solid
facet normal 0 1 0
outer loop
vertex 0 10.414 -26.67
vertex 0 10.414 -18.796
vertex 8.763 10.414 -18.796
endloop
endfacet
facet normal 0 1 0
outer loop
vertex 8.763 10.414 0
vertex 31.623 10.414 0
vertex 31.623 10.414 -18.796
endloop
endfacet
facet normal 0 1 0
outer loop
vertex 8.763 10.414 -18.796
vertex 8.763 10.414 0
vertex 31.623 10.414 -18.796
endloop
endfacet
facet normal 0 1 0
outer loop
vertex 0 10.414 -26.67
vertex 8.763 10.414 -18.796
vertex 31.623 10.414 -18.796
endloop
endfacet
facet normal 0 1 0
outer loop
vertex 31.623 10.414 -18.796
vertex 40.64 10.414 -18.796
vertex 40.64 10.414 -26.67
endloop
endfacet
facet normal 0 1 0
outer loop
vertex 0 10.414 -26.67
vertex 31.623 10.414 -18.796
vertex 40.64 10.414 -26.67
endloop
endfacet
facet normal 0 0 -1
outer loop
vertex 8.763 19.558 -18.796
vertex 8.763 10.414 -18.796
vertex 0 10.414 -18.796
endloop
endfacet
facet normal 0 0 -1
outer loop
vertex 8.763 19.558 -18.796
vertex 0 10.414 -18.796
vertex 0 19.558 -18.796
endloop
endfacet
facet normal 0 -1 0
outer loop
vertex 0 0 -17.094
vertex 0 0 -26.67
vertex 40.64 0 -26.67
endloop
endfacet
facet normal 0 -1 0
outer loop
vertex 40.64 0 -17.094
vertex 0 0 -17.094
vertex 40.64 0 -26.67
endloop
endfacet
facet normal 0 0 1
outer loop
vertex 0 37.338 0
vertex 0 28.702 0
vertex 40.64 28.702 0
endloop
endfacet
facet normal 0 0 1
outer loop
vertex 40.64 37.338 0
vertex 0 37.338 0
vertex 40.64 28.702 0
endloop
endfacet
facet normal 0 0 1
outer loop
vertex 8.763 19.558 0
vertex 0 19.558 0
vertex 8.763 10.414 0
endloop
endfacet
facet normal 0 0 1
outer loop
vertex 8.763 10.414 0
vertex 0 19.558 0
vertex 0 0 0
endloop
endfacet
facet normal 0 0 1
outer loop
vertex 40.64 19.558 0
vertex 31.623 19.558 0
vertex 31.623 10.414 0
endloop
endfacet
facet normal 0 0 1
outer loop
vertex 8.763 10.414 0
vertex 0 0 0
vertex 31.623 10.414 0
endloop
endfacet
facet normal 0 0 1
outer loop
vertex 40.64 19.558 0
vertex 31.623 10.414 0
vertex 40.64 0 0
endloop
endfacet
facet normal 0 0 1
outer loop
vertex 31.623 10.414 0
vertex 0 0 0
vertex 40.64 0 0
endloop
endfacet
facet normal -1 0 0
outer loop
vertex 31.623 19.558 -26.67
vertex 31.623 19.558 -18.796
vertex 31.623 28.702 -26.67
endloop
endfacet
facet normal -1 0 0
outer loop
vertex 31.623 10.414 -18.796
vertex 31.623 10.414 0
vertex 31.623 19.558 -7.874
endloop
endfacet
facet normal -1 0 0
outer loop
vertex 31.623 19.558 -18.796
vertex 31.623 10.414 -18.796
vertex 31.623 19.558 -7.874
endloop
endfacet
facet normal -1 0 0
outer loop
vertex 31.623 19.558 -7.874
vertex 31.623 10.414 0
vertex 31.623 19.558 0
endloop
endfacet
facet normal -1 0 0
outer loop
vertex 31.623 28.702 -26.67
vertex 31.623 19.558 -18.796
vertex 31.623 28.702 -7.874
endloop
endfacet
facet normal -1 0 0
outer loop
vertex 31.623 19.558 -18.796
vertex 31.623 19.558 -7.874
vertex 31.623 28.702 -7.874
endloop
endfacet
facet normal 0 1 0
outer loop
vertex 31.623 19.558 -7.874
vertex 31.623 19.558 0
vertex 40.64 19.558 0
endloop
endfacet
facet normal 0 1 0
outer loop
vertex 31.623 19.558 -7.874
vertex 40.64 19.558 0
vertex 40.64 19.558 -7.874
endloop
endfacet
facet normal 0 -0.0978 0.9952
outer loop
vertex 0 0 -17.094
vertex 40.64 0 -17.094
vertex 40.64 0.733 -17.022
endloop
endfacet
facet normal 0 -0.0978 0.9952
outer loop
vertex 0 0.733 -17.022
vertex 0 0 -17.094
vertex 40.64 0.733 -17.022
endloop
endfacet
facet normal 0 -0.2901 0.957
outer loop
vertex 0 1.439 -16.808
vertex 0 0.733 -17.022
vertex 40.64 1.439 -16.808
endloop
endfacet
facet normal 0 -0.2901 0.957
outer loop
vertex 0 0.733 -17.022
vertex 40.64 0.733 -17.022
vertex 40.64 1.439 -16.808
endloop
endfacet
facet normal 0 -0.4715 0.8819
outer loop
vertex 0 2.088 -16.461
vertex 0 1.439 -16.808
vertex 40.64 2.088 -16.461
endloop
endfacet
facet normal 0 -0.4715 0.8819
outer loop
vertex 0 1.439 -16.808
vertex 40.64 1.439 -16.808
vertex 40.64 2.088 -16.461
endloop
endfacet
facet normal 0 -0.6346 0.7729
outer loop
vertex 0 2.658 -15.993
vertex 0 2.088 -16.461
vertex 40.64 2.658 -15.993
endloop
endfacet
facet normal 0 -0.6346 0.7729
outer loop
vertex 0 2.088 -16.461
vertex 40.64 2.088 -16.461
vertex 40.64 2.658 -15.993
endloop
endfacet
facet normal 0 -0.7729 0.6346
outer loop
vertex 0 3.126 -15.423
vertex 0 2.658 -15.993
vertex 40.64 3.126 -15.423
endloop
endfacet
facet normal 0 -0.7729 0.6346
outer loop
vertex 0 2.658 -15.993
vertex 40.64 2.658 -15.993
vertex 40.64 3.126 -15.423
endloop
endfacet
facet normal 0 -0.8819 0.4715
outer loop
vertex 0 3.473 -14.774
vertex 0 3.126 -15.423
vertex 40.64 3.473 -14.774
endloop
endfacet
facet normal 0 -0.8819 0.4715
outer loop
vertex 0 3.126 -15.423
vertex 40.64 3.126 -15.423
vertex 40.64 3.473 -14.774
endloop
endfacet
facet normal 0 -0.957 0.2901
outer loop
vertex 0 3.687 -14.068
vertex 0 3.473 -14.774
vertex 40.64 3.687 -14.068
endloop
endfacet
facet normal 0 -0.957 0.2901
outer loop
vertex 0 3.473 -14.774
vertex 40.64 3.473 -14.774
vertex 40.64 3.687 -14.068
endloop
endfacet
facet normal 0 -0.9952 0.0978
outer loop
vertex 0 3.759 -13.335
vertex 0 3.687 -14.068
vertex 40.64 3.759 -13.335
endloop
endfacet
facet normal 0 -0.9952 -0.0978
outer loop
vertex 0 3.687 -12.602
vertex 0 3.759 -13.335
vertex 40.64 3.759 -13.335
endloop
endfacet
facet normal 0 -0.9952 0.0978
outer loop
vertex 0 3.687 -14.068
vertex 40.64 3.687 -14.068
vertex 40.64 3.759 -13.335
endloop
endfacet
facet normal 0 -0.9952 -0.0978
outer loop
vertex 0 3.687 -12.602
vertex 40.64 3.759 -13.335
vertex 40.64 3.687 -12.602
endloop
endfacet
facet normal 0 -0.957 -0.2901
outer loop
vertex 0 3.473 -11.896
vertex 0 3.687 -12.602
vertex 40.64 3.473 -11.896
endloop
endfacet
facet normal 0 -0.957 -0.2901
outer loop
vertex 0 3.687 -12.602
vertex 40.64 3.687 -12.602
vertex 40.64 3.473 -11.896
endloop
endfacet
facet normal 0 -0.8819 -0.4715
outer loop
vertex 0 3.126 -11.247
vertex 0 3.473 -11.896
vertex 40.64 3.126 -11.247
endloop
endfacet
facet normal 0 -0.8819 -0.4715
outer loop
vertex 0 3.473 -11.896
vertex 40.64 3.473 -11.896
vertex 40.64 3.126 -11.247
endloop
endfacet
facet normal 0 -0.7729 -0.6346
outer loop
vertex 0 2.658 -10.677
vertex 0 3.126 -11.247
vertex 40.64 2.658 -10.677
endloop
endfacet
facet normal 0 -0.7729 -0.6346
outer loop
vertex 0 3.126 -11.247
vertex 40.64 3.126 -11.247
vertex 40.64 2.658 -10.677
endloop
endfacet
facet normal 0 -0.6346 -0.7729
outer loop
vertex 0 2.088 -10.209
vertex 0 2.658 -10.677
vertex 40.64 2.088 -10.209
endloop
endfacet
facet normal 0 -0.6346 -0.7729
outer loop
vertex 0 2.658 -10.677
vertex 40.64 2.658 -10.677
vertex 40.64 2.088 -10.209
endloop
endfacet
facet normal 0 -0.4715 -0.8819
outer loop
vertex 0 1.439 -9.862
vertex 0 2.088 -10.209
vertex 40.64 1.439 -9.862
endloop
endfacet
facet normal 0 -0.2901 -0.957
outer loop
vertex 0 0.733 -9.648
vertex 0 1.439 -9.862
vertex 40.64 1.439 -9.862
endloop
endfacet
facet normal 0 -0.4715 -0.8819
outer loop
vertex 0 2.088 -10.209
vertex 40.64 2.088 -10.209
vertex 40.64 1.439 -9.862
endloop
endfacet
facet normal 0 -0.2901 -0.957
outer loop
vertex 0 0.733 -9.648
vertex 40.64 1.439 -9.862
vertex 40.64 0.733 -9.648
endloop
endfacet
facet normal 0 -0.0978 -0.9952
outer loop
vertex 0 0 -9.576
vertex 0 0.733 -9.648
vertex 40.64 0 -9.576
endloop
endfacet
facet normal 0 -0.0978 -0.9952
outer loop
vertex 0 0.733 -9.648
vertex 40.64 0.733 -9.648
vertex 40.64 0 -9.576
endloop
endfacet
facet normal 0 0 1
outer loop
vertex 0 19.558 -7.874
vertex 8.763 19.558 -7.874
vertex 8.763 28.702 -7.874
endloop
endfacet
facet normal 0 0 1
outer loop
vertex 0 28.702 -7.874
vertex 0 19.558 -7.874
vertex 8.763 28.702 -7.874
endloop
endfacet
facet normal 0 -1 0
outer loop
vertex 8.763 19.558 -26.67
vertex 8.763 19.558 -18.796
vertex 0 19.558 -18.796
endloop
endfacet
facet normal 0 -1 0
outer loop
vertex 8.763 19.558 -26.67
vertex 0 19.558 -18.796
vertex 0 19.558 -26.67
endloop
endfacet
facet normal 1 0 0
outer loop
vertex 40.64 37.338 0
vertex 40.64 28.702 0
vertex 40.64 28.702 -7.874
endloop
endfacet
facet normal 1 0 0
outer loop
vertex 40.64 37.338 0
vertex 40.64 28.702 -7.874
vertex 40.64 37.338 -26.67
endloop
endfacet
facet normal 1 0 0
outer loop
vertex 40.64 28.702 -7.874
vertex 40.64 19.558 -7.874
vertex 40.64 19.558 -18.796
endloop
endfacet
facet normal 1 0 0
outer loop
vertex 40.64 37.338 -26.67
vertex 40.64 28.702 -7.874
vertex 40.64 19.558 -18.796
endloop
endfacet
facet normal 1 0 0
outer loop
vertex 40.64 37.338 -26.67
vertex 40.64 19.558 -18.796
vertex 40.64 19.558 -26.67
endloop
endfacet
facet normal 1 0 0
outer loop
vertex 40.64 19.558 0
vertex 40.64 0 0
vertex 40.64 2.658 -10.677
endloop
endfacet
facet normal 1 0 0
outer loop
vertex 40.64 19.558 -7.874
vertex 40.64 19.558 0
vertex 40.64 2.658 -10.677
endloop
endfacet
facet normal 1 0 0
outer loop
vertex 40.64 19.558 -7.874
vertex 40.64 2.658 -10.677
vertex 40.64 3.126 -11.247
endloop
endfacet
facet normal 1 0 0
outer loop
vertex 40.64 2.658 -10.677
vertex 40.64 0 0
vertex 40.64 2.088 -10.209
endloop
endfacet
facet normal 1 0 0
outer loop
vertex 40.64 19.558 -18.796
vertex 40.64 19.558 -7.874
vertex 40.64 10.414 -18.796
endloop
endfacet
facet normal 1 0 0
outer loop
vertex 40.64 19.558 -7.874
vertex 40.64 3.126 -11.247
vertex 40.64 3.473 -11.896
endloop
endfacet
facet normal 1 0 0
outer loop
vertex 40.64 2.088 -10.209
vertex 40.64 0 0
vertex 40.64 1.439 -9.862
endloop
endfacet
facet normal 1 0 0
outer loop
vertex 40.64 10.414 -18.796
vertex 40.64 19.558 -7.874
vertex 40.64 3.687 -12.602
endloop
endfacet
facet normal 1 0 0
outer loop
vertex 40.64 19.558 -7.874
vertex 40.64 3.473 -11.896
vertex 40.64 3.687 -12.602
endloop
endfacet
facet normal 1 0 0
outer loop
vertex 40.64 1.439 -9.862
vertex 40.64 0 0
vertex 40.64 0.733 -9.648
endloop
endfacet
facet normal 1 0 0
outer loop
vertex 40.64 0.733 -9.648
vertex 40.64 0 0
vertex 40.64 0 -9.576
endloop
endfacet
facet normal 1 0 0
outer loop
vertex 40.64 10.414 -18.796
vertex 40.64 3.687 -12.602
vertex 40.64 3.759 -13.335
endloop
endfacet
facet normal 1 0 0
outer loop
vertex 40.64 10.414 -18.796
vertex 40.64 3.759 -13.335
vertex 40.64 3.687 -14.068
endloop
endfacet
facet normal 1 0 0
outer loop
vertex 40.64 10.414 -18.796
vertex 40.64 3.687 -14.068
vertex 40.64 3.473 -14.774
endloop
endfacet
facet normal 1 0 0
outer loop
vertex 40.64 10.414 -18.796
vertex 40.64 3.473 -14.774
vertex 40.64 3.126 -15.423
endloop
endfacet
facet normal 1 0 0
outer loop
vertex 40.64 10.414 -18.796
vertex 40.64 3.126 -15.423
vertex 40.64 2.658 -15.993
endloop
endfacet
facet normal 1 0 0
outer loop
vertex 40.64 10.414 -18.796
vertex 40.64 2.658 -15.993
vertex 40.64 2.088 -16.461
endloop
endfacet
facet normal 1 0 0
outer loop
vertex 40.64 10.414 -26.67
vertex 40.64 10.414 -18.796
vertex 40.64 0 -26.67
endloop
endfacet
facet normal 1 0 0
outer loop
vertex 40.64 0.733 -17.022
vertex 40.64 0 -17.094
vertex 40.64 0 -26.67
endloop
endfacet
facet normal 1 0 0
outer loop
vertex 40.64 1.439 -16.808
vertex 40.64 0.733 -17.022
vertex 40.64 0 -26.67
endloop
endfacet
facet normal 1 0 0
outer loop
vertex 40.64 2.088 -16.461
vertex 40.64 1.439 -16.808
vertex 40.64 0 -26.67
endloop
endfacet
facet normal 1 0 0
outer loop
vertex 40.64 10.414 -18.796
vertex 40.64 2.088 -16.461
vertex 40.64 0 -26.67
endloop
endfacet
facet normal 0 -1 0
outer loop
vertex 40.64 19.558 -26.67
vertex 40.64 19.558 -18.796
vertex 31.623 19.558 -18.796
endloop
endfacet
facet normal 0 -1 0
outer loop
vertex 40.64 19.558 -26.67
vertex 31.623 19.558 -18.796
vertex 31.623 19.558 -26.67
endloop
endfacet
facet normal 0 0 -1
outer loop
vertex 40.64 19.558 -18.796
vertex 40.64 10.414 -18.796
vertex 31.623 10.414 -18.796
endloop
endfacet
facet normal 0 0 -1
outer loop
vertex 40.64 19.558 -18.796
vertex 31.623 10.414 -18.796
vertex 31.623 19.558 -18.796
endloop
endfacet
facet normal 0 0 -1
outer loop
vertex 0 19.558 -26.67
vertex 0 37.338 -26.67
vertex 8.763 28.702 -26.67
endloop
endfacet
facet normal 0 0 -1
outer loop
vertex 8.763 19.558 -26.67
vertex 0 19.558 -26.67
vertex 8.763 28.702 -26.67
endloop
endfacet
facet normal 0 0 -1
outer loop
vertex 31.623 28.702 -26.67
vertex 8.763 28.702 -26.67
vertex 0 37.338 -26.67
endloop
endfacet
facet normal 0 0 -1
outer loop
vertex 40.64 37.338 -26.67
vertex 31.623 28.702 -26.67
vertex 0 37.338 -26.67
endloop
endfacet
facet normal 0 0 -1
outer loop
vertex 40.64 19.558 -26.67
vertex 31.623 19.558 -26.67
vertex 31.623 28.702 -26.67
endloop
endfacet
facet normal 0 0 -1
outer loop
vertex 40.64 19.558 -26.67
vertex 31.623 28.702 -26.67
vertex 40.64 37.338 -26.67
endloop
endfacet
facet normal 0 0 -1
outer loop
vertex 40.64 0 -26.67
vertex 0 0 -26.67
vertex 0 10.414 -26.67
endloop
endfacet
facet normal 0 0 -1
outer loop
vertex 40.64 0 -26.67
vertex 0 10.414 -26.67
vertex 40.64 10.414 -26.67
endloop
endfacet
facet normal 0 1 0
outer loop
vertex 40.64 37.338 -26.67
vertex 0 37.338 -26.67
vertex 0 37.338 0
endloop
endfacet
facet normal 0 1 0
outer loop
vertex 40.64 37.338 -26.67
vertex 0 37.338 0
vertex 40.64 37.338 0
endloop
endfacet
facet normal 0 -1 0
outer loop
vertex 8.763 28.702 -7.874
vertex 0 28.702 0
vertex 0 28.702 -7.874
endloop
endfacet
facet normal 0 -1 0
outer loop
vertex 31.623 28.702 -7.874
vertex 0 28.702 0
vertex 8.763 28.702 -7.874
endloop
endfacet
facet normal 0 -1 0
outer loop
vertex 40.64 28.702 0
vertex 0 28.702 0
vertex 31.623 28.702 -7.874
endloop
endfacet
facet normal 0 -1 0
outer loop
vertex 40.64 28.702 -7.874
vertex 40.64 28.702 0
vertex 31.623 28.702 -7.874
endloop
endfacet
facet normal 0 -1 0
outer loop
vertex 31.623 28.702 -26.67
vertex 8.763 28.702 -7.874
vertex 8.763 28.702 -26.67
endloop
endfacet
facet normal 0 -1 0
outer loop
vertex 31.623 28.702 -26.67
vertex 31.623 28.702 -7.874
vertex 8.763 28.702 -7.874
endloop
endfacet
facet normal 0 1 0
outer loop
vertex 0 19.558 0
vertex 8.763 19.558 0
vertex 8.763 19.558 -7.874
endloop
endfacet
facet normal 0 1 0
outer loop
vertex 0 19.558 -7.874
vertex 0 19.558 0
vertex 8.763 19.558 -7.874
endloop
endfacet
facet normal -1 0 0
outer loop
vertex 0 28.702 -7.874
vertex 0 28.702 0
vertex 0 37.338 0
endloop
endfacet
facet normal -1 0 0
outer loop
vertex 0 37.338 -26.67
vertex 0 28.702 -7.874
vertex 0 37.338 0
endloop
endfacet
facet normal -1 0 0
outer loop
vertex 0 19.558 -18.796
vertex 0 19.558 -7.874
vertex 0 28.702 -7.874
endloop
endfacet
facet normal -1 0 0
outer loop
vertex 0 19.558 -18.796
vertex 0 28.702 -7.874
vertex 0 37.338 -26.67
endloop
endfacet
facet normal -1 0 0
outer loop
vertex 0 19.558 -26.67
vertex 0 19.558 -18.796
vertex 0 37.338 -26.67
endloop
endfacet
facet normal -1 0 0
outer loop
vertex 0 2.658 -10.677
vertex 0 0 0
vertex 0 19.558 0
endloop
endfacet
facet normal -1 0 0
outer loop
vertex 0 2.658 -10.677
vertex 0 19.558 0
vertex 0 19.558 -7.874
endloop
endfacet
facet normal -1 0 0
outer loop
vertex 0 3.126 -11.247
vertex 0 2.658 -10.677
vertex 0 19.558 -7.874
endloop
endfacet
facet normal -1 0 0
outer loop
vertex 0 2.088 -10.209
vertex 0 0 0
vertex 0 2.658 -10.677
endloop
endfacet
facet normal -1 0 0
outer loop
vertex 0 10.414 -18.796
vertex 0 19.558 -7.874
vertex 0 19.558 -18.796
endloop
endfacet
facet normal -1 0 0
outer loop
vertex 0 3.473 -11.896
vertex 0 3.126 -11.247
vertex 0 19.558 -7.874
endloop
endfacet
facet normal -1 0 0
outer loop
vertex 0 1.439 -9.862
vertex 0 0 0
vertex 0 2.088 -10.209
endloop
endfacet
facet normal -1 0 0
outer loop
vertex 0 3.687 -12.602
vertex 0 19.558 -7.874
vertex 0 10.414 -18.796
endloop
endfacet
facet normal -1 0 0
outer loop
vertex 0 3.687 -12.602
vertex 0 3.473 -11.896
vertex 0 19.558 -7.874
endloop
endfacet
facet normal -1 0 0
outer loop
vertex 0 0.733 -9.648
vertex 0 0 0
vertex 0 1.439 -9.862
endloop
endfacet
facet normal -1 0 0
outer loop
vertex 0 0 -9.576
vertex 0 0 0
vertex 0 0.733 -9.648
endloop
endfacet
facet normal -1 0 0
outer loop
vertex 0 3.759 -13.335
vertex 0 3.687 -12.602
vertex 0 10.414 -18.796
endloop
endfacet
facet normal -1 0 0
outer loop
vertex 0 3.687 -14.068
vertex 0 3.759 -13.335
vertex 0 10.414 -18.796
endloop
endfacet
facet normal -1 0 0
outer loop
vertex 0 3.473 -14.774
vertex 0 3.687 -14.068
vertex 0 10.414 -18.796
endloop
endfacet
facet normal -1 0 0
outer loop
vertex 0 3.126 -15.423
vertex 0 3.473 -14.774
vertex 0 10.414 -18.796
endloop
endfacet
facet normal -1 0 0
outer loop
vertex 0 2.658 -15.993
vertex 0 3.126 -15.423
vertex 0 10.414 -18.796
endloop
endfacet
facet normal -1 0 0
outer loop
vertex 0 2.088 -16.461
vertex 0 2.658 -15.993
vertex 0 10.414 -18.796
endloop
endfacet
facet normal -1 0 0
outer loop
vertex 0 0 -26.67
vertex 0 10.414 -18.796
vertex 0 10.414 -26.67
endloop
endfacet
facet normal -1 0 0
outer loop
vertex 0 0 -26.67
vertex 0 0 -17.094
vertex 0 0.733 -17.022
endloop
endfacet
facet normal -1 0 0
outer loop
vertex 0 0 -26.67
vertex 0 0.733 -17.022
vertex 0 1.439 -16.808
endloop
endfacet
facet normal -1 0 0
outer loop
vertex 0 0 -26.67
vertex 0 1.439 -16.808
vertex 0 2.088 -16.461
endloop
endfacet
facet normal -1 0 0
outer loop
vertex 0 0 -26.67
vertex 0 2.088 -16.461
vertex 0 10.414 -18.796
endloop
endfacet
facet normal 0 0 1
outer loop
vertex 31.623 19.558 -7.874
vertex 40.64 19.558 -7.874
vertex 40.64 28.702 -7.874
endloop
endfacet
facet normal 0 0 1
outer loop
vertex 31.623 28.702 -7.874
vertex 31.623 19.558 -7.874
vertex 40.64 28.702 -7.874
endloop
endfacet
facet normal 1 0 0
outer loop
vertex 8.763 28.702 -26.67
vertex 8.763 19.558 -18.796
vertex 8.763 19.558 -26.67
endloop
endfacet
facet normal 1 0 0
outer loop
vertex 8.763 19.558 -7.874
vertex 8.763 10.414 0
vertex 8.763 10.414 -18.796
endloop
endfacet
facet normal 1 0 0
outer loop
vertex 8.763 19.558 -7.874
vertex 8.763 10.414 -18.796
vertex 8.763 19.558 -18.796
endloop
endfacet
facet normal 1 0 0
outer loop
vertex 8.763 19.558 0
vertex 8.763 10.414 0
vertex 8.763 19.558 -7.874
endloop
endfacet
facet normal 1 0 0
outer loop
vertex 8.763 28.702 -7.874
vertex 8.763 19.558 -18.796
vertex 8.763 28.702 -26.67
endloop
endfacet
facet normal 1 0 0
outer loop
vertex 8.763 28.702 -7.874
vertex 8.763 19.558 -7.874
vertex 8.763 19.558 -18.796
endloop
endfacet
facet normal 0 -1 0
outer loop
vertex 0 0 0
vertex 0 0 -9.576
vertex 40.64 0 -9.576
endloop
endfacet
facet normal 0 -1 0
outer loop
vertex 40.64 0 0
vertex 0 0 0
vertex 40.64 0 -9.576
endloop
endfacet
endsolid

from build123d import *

# Parameters (mm, degrees)
SKETCH2_W             = 40.64
SKETCH2_H             = 26.67
BOSS_EXTRUDE1_DEPTH   = 37.338
SKETCH3_R             = 3.7592
BODY_TUBE_CUT_DEPTH   = 62.294573528
SKETCH4_W             = 22.86
SKETCH4_H             = 18.288
SERVO_BODY_HOLE_DEPTH = 26.67
CUT_EXTRUDE3_REACH    = 63.295
SKETCH5_W             = 7.874
SKETCH5_H             = 9.144


with BuildPart() as part:
    # Sketch2 → Boss-Extrude1 (new body)
    with BuildSketch(Plane(origin=(0, 0, 0), x_dir=(1, 0, 0), z_dir=(0, 1, 0))):
        with Locations((20.32, 13.335)):
            Rectangle(SKETCH2_W, SKETCH2_H)
    extrude(amount=BOSS_EXTRUDE1_DEPTH)

    # Sketch3 → Body Tube Cut (cut, through all)
    with BuildSketch(Plane(origin=(40.64, 0, 0), x_dir=(0, 0, -1), z_dir=(1, 0, 0))):
        with Locations((13.335, 0)):
            Circle(SKETCH3_R)
    extrude(amount=-BODY_TUBE_CUT_DEPTH, mode=Mode.SUBTRACT)

    # Sketch4 → Servo Body Hole (cut)
    with BuildSketch(Plane.XY):
        with Locations((20.193, 19.558)):
            Rectangle(SKETCH4_W, SKETCH4_H)
    extrude(amount=-SERVO_BODY_HOLE_DEPTH, mode=Mode.SUBTRACT)

    # Cut-Extrude3: up to this face of the body (flat: up to its plane)
    cut_extrude3_end = Plane(part.part.faces().sort_by_distance((0, 19.058270015, -13.335))[0])
    # Sketch5 → Cut-Extrude3 (cut, up to the picked face)
    with BuildSketch(Plane(origin=(40.64, 0, 0), x_dir=(0, 0, -1), z_dir=(1, 0, 0)), mode=Mode.PRIVATE) as cut_extrude3_sk1:
        with Locations((3.937, 24.13)):
            Rectangle(SKETCH5_W, SKETCH5_H)
    cut_extrude3_tool1 = split(extrude(cut_extrude3_sk1.sketch, amount=-CUT_EXTRUDE3_REACH, mode=Mode.PRIVATE), bisect_by=cut_extrude3_end, keep=Keep.BOTH, mode=Mode.PRIVATE)
    # Sketch5 → Cut-Extrude3 (cut, up to the picked face)
    with BuildSketch(Plane(origin=(40.64, 0, 0), x_dir=(0, 0, -1), z_dir=(1, 0, 0)), mode=Mode.PRIVATE) as cut_extrude3_sk2:
        with Locations((22.733, 14.986)):
            Rectangle(SKETCH5_W, SKETCH5_H)
    cut_extrude3_tool2 = split(extrude(cut_extrude3_sk2.sketch, amount=-CUT_EXTRUDE3_REACH, mode=Mode.PRIVATE), bisect_by=cut_extrude3_end, keep=Keep.BOTH, mode=Mode.PRIVATE)
    add(cut_extrude3_tool1.solids().sort_by(Axis((40.64, 24.13, -3.937), (-1, 0, 0)))[0], mode=Mode.SUBTRACT)
    add(cut_extrude3_tool2.solids().sort_by(Axis((40.64, 14.986, -22.733), (-1, 0, 0)))[0], mode=Mode.SUBTRACT)


solid = part.part
